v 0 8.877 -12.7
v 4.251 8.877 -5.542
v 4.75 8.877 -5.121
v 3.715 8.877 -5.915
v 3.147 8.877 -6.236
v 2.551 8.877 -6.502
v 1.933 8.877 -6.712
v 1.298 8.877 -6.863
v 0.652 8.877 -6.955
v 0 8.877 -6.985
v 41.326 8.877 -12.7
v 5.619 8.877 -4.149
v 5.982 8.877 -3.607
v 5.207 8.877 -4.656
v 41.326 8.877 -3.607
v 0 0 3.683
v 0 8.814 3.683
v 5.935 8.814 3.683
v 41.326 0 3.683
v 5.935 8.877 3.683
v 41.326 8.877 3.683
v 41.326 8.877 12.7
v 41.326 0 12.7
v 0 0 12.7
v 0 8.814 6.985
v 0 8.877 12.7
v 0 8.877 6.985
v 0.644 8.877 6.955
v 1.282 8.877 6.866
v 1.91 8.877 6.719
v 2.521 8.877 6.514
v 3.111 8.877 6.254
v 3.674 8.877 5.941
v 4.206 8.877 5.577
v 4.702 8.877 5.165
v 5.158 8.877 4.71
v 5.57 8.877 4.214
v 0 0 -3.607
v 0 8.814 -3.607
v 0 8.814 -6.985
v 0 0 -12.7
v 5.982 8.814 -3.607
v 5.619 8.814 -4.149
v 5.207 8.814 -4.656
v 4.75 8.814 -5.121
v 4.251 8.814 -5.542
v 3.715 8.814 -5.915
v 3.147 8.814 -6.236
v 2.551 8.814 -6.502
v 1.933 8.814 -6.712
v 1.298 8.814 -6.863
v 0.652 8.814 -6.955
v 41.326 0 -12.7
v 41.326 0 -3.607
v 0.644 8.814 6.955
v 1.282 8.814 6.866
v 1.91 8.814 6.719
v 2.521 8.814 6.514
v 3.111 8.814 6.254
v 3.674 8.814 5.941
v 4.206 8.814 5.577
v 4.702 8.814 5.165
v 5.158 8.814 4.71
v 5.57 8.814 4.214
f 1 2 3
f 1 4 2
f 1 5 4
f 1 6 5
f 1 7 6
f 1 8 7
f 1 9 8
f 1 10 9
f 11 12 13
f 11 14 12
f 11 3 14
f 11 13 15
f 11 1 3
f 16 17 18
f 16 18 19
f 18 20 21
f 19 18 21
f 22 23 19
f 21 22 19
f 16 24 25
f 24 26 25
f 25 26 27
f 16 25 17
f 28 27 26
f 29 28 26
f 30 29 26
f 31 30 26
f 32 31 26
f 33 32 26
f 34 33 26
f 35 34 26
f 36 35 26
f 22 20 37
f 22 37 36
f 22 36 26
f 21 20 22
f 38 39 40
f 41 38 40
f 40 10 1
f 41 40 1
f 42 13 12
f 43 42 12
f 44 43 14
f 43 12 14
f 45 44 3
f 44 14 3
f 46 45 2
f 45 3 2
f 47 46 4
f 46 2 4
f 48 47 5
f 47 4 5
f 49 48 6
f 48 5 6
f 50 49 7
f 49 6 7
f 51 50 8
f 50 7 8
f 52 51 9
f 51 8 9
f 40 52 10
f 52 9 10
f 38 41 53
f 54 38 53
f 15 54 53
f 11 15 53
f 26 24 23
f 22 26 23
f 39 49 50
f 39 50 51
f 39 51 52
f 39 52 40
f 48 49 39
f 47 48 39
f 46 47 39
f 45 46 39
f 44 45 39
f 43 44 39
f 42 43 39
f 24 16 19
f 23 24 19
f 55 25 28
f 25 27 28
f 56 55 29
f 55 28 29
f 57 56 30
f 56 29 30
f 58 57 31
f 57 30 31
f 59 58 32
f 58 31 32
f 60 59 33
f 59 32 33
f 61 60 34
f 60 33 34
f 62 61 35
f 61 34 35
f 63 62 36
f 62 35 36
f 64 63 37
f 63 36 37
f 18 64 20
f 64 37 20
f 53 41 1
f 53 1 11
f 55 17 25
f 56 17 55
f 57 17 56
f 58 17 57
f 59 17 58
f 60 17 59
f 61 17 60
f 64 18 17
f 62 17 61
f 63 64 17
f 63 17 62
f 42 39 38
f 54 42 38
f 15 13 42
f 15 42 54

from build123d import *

# Parameters (mm, degrees)
SKETCH1_W                   = 82.6516
SKETCH1_H                   = 25.4
BOSS_EXTRUDE1_DEPTH         = 9.5758
SKETCH2_W                   = 50.8
SKETCH2_H                   = 7.2898
CUT_EXTRUDE1_DEPTH          = 45.281008246
SKETCH8_W                   = 2.902818519
SKETCH8_H                   = 9.580147983
BOSS_EXTRUDE4_DEPTH         = 25.4
SKETCH10_R                  = 12.7
BOSS_EXTRUDE5_DEPTH         = 50.1015
SKETCH12_R                  = 6.985
CUT_EXTRUDE2_DEPTH          = 50.8635
CHAMFER1_SIZE               = 2.54
SKETCH14_W                  = 12.7
SKETCH14_H                  = 25.4
BOSS_EXTRUDE6_DEPTH         = 15.24
CUT_EXTRUDE3_REACH          = 81.551
SKETCH18_W                  = 5.842
SKETCH18_H                  = 11.43
F_1_4_CLEARANCE_HOLE2_D     = 6.7564
F_1_4_CLEARANCE_HOLE2_DEPTH = 20.32
F_1_4_CLEARANCE_HOLE2_TIP   = 2.029827343
CHAMFER2_SIZE               = 10.16
SKETCH21_W                  = 102.171089711
SKETCH21_H                  = 59.0255269
CUT_EXTRUDE4_DEPTH          = 50.8
SKETCH22_W                  = 33.761950456
SKETCH22_H                  = 15.29053624
CUT_EXTRUDE5_DEPTH          = 45.135226304


with BuildPart() as part:
    # Sketch1 → Boss-Extrude1 (new body)
    with BuildSketch(Plane(origin=(0, 0, 0), x_dir=(1, 0, 0), z_dir=(0, 1, 0))):
        Rectangle(SKETCH1_W, SKETCH1_H)
    extrude(amount=BOSS_EXTRUDE1_DEPTH)

    # Sketch2 → Cut-Extrude1 (cut, through all)
    with BuildSketch(Plane(origin=(0, 9.5758, 0), x_dir=(1, 0, 0), z_dir=(0, 1, 0))):
        with Locations((15.9258, -0.0381)):
            Rectangle(SKETCH2_W, SKETCH2_H)
    extrude(amount=-CUT_EXTRUDE1_DEPTH, mode=Mode.SUBTRACT)

    # Sketch8 → Boss-Extrude4 (add, through all)
    with BuildSketch(Plane.XY.offset(12.7)):
        with Locations((-1.45140926, 4.790073991)):
            Rectangle(SKETCH8_W, SKETCH8_H)
    extrude(amount=-BOSS_EXTRUDE4_DEPTH)

    # Sketch10 → Boss-Extrude5 (add)
    with BuildSketch(Plane(origin=(0, 9.5758, 0), x_dir=(1, 0, 0), z_dir=(0, 1, 0))):
        with Locations(Location((0, 0, 0), (0, 0, 270))):
            Circle(SKETCH10_R)
    extrude(amount=BOSS_EXTRUDE5_DEPTH)

    # Sketch12 → Cut-Extrude2 (cut)
    with BuildSketch(Plane(origin=(0, 59.6773, 0), x_dir=(1, 0, 0), z_dir=(0, 1, 0))):
        with Locations(Location((0, 0, 0), (0, 0, 270))):
            Circle(SKETCH12_R)
    extrude(amount=-CUT_EXTRUDE2_DEPTH, mode=Mode.SUBTRACT)

    # Chamfer1
    chamfer1_edges = [part.edges().sort_by_distance(p)[0] for p in [
        (0, 59.6773, -12.7),
    ]]
    chamfer(chamfer1_edges, length=CHAMFER1_SIZE)

    # Sketch14 → Boss-Extrude6 (add)
    with BuildSketch(Plane.XY.offset(-6.985)):
        with Locations((0, 41.790845474)):
            Rectangle(SKETCH14_W, SKETCH14_H)
    extrude(amount=-BOSS_EXTRUDE6_DEPTH)

    # Sketch18 → Cut-Extrude3 (cut, up to next)
    with BuildSketch(Plane(origin=(6.35, 0, 0), x_dir=(0, 0, -1), z_dir=(1, 0, 0)), mode=Mode.PRIVATE) as cut_extrude3_sk1:
        with Locations((16.149395763, 44.965845474)):
            Rectangle(SKETCH18_W, SKETCH18_H)
    cut_extrude3_tool1 = extrude(cut_extrude3_sk1.sketch, amount=-CUT_EXTRUDE3_REACH, mode=Mode.PRIVATE) & part.part
    add(cut_extrude3_tool1.solids().sort_by_distance((6.35, 44.965845, -16.149396))[0], mode=Mode.SUBTRACT)

    # 1/4 Clearance Hole2
    with Locations(Plane(origin=(0, 0, -22.225), x_dir=(-1, 0, 0), z_dir=(0, 0, -1))):
        with Locations((0, 44.965845474)):
            Hole(F_1_4_CLEARANCE_HOLE2_D / 2, depth=F_1_4_CLEARANCE_HOLE2_DEPTH)
            with Locations((0, 0, -(F_1_4_CLEARANCE_HOLE2_DEPTH + F_1_4_CLEARANCE_HOLE2_TIP / 2))):  # 118° drill point
                Cone(0, F_1_4_CLEARANCE_HOLE2_D / 2, F_1_4_CLEARANCE_HOLE2_TIP, mode=Mode.SUBTRACT)

    # Chamfer2
    # the kernel refuses this chamfer: 10.16 mm, written as the material it takes off along each edge
    with BuildSketch(Plane(origin=(32.478299158, 29.090845474, -22.225), x_dir=(0, -0.027495876610586265, 0.9996219169112968), z_dir=(-1, 0, 0))) as chamfer2_piece_1_section:
        Polygon((CHAMFER2_SIZE * 0.999621916911, CHAMFER2_SIZE * 0.0274958766106), (-CHAMFER2_SIZE * 0.0274958766106, CHAMFER2_SIZE * 0.999621916911), (0, 0), align=None)
    chamfer2_piece_1 = extrude(amount=64.956598315, mode=Mode.PRIVATE)
    chamfer2_piece_1 = chamfer2_piece_1 - Plane(origin=(0, 32.444576681, 0), x_dir=(0, 0, 1), z_dir=(0, -1, 0)) * Cylinder(12.7, 171, mode=Mode.PRIVATE)
    add(chamfer2_piece_1, mode=Mode.SUBTRACT)

    # Sketch21 → Cut-Extrude4 (cut)
    with BuildSketch(Plane(origin=(0, 59.6773, 0), x_dir=(1, 0, 0), z_dir=(0, 1, 0))):
        with Locations((-1.148550861, 3.01470521)):
            Rectangle(SKETCH21_W, SKETCH21_H)
    extrude(amount=-CUT_EXTRUDE4_DEPTH, mode=Mode.SUBTRACT)

    # Sketch22 → Cut-Extrude5 (cut, through all)
    with BuildSketch(Plane(origin=(0, 0, 0), x_dir=(0, 0, -1), z_dir=(1, 0, 0))):
        with Locations((-0.418536576, 4.020113424)):
            Rectangle(SKETCH22_W, SKETCH22_H)
    extrude(amount=-CUT_EXTRUDE5_DEPTH, mode=Mode.SUBTRACT)


with BuildPart() as cut_extrude5_piece_1:
    # of the separate pieces the step leaves, piece 1, a body of its own (cut_extrude5_pieces)
    add(part.part.solids().sort_by_distance((0, 0, -12.7))[0])


with BuildPart() as cut_extrude5_piece_2:
    # of the separate pieces the step leaves, piece 2, a body of its own (cut_extrude5_pieces)
    add(part.part.solids().sort_by_distance((5.935127294, 8.8773, 3.683))[0])


solid = Compound([cut_extrude5_piece_1.part, cut_extrude5_piece_2.part])
